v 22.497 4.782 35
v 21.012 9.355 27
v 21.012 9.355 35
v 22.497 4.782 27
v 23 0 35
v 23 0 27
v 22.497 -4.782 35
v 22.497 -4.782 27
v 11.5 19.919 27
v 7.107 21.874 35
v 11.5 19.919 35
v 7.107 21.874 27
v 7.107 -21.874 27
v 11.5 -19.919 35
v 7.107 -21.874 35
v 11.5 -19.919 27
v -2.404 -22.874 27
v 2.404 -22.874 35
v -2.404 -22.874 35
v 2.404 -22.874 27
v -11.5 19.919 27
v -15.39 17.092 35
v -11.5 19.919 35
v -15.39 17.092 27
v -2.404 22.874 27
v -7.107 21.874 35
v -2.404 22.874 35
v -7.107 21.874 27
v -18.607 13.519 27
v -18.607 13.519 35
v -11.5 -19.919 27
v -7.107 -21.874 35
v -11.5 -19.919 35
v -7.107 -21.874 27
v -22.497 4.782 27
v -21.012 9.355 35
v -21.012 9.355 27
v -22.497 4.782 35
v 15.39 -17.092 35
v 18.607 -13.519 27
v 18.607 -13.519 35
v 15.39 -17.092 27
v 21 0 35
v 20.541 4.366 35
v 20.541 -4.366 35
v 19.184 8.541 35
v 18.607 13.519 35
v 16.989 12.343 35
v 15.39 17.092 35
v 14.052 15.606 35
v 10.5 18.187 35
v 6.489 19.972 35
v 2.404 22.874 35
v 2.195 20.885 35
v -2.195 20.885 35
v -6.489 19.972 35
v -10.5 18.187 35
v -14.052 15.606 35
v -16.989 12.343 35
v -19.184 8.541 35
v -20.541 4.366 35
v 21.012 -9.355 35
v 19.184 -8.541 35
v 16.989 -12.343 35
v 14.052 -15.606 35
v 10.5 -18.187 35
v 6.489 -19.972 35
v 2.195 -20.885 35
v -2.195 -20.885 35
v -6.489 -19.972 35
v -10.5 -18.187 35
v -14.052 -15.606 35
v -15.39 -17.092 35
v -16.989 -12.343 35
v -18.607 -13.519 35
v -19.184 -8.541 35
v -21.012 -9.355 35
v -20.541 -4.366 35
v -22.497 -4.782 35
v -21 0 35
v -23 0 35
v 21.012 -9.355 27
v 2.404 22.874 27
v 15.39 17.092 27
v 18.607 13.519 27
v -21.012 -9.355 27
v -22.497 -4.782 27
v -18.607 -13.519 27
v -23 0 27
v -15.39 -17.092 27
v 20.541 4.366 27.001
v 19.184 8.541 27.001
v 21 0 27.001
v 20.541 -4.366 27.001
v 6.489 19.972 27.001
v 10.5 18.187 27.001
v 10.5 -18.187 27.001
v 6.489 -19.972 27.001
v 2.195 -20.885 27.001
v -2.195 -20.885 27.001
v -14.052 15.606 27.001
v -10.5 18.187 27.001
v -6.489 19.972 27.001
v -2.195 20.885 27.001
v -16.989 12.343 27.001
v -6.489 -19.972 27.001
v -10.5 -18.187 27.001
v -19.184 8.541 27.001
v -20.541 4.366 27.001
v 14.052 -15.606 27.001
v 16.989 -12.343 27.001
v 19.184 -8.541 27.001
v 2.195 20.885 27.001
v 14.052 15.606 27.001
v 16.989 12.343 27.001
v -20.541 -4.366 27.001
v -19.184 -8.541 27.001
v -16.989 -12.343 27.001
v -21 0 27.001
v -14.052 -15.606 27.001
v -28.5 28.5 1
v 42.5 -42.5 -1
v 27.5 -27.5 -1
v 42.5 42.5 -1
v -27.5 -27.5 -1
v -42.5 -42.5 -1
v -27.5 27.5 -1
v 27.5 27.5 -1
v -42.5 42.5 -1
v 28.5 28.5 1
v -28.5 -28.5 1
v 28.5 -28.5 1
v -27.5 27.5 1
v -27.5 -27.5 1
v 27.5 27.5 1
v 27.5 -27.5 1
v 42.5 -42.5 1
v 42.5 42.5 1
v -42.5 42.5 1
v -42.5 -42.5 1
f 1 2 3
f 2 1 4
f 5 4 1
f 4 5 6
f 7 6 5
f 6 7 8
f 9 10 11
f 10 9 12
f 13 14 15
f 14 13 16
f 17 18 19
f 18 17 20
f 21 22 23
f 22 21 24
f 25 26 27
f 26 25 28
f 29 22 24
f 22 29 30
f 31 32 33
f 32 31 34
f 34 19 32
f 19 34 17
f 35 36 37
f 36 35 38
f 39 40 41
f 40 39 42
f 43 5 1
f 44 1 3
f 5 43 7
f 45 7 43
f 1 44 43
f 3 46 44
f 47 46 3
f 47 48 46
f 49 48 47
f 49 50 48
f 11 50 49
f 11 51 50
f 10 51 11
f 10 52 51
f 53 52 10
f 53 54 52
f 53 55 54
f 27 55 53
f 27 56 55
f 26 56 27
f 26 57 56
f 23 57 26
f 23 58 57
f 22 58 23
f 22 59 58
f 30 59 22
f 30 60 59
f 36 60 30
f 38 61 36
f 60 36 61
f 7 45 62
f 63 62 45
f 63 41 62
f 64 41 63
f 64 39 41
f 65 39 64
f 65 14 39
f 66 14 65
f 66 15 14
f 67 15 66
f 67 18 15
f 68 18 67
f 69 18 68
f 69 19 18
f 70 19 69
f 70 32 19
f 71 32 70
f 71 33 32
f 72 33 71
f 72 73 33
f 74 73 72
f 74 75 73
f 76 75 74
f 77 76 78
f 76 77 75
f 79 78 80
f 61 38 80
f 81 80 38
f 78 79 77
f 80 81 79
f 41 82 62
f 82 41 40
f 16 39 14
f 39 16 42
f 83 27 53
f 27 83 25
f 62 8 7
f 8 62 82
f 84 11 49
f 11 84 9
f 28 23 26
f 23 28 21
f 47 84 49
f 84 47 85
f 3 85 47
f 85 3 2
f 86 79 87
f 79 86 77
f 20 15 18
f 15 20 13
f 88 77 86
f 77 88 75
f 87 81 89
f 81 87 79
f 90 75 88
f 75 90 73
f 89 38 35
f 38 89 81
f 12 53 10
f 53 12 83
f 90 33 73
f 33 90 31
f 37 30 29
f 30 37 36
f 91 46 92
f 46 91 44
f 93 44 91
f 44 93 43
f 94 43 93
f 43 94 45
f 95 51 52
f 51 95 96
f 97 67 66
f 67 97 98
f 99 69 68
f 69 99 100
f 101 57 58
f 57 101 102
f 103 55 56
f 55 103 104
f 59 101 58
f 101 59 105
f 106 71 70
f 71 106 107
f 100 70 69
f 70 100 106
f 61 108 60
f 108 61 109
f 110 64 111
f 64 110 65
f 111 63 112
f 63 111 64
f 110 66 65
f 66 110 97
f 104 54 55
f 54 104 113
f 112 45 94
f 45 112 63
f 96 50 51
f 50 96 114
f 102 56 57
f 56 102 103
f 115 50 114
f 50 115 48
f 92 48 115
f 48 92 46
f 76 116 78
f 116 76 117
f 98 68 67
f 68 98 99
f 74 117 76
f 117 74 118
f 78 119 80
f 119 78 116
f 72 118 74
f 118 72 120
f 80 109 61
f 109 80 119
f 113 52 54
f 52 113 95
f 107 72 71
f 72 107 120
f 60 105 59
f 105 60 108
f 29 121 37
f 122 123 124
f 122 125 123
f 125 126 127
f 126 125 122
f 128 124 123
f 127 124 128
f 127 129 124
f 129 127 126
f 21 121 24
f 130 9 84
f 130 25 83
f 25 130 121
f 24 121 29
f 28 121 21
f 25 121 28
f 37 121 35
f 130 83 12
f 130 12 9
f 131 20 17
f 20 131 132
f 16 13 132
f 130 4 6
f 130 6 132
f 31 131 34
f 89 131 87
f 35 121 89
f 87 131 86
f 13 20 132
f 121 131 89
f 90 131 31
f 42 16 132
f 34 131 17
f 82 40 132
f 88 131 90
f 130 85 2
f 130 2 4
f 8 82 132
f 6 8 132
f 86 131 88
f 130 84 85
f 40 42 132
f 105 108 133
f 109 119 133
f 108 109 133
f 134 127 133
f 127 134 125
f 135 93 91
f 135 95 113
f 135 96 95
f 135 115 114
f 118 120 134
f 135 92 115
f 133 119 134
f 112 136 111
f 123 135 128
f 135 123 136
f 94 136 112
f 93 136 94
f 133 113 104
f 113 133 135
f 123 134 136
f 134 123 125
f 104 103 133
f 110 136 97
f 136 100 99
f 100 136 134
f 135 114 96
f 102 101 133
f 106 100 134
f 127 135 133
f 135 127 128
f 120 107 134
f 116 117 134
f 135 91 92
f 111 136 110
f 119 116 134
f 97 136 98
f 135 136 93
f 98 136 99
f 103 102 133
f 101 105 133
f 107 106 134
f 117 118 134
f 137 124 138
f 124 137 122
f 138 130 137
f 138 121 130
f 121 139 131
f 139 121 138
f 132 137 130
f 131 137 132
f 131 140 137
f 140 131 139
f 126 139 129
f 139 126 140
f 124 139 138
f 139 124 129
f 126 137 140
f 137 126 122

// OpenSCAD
module connector(
    out_l,
    in_r,
    h,
    flange,
    thickness,
    angle = 0,
    angle_v = [0,0,0],
    connector_h = 0
) {
    difference() {
        union() {
            hull() {
                cube([(out_l + thickness), (out_l + thickness), thickness], center=true);
                rotate(angle, angle_v)
                translate(v = [0,0,h]) 
                cylinder(h = thickness, r = in_r + thickness);
            }
            // connector
            translate([0,0,h])
            difference() {
                cylinder(h = connector_h, r = in_r + thickness);
                cylinder(h = connector_h, r = in_r);
            }
        }
        hull() {
            cube([out_l, out_l, thickness], center=true);
            rotate(angle, angle_v)
            translate(v = [0,0,h + .001]) 
            cylinder(h = thickness, r = in_r);
        }
    }
    // flange
    difference() {
        cube([out_l + flange * 2, out_l + flange * 2, thickness], center=true);
        cube([out_l, out_l, thickness], center=true);
    }
}

connector(
    out_l = 55,
    in_r = 21,
    h = 25,
    angle = 0,
    angle_v = [1,1,0],
    thickness = 2,
    flange = 15,
    connector_h = 10
);
